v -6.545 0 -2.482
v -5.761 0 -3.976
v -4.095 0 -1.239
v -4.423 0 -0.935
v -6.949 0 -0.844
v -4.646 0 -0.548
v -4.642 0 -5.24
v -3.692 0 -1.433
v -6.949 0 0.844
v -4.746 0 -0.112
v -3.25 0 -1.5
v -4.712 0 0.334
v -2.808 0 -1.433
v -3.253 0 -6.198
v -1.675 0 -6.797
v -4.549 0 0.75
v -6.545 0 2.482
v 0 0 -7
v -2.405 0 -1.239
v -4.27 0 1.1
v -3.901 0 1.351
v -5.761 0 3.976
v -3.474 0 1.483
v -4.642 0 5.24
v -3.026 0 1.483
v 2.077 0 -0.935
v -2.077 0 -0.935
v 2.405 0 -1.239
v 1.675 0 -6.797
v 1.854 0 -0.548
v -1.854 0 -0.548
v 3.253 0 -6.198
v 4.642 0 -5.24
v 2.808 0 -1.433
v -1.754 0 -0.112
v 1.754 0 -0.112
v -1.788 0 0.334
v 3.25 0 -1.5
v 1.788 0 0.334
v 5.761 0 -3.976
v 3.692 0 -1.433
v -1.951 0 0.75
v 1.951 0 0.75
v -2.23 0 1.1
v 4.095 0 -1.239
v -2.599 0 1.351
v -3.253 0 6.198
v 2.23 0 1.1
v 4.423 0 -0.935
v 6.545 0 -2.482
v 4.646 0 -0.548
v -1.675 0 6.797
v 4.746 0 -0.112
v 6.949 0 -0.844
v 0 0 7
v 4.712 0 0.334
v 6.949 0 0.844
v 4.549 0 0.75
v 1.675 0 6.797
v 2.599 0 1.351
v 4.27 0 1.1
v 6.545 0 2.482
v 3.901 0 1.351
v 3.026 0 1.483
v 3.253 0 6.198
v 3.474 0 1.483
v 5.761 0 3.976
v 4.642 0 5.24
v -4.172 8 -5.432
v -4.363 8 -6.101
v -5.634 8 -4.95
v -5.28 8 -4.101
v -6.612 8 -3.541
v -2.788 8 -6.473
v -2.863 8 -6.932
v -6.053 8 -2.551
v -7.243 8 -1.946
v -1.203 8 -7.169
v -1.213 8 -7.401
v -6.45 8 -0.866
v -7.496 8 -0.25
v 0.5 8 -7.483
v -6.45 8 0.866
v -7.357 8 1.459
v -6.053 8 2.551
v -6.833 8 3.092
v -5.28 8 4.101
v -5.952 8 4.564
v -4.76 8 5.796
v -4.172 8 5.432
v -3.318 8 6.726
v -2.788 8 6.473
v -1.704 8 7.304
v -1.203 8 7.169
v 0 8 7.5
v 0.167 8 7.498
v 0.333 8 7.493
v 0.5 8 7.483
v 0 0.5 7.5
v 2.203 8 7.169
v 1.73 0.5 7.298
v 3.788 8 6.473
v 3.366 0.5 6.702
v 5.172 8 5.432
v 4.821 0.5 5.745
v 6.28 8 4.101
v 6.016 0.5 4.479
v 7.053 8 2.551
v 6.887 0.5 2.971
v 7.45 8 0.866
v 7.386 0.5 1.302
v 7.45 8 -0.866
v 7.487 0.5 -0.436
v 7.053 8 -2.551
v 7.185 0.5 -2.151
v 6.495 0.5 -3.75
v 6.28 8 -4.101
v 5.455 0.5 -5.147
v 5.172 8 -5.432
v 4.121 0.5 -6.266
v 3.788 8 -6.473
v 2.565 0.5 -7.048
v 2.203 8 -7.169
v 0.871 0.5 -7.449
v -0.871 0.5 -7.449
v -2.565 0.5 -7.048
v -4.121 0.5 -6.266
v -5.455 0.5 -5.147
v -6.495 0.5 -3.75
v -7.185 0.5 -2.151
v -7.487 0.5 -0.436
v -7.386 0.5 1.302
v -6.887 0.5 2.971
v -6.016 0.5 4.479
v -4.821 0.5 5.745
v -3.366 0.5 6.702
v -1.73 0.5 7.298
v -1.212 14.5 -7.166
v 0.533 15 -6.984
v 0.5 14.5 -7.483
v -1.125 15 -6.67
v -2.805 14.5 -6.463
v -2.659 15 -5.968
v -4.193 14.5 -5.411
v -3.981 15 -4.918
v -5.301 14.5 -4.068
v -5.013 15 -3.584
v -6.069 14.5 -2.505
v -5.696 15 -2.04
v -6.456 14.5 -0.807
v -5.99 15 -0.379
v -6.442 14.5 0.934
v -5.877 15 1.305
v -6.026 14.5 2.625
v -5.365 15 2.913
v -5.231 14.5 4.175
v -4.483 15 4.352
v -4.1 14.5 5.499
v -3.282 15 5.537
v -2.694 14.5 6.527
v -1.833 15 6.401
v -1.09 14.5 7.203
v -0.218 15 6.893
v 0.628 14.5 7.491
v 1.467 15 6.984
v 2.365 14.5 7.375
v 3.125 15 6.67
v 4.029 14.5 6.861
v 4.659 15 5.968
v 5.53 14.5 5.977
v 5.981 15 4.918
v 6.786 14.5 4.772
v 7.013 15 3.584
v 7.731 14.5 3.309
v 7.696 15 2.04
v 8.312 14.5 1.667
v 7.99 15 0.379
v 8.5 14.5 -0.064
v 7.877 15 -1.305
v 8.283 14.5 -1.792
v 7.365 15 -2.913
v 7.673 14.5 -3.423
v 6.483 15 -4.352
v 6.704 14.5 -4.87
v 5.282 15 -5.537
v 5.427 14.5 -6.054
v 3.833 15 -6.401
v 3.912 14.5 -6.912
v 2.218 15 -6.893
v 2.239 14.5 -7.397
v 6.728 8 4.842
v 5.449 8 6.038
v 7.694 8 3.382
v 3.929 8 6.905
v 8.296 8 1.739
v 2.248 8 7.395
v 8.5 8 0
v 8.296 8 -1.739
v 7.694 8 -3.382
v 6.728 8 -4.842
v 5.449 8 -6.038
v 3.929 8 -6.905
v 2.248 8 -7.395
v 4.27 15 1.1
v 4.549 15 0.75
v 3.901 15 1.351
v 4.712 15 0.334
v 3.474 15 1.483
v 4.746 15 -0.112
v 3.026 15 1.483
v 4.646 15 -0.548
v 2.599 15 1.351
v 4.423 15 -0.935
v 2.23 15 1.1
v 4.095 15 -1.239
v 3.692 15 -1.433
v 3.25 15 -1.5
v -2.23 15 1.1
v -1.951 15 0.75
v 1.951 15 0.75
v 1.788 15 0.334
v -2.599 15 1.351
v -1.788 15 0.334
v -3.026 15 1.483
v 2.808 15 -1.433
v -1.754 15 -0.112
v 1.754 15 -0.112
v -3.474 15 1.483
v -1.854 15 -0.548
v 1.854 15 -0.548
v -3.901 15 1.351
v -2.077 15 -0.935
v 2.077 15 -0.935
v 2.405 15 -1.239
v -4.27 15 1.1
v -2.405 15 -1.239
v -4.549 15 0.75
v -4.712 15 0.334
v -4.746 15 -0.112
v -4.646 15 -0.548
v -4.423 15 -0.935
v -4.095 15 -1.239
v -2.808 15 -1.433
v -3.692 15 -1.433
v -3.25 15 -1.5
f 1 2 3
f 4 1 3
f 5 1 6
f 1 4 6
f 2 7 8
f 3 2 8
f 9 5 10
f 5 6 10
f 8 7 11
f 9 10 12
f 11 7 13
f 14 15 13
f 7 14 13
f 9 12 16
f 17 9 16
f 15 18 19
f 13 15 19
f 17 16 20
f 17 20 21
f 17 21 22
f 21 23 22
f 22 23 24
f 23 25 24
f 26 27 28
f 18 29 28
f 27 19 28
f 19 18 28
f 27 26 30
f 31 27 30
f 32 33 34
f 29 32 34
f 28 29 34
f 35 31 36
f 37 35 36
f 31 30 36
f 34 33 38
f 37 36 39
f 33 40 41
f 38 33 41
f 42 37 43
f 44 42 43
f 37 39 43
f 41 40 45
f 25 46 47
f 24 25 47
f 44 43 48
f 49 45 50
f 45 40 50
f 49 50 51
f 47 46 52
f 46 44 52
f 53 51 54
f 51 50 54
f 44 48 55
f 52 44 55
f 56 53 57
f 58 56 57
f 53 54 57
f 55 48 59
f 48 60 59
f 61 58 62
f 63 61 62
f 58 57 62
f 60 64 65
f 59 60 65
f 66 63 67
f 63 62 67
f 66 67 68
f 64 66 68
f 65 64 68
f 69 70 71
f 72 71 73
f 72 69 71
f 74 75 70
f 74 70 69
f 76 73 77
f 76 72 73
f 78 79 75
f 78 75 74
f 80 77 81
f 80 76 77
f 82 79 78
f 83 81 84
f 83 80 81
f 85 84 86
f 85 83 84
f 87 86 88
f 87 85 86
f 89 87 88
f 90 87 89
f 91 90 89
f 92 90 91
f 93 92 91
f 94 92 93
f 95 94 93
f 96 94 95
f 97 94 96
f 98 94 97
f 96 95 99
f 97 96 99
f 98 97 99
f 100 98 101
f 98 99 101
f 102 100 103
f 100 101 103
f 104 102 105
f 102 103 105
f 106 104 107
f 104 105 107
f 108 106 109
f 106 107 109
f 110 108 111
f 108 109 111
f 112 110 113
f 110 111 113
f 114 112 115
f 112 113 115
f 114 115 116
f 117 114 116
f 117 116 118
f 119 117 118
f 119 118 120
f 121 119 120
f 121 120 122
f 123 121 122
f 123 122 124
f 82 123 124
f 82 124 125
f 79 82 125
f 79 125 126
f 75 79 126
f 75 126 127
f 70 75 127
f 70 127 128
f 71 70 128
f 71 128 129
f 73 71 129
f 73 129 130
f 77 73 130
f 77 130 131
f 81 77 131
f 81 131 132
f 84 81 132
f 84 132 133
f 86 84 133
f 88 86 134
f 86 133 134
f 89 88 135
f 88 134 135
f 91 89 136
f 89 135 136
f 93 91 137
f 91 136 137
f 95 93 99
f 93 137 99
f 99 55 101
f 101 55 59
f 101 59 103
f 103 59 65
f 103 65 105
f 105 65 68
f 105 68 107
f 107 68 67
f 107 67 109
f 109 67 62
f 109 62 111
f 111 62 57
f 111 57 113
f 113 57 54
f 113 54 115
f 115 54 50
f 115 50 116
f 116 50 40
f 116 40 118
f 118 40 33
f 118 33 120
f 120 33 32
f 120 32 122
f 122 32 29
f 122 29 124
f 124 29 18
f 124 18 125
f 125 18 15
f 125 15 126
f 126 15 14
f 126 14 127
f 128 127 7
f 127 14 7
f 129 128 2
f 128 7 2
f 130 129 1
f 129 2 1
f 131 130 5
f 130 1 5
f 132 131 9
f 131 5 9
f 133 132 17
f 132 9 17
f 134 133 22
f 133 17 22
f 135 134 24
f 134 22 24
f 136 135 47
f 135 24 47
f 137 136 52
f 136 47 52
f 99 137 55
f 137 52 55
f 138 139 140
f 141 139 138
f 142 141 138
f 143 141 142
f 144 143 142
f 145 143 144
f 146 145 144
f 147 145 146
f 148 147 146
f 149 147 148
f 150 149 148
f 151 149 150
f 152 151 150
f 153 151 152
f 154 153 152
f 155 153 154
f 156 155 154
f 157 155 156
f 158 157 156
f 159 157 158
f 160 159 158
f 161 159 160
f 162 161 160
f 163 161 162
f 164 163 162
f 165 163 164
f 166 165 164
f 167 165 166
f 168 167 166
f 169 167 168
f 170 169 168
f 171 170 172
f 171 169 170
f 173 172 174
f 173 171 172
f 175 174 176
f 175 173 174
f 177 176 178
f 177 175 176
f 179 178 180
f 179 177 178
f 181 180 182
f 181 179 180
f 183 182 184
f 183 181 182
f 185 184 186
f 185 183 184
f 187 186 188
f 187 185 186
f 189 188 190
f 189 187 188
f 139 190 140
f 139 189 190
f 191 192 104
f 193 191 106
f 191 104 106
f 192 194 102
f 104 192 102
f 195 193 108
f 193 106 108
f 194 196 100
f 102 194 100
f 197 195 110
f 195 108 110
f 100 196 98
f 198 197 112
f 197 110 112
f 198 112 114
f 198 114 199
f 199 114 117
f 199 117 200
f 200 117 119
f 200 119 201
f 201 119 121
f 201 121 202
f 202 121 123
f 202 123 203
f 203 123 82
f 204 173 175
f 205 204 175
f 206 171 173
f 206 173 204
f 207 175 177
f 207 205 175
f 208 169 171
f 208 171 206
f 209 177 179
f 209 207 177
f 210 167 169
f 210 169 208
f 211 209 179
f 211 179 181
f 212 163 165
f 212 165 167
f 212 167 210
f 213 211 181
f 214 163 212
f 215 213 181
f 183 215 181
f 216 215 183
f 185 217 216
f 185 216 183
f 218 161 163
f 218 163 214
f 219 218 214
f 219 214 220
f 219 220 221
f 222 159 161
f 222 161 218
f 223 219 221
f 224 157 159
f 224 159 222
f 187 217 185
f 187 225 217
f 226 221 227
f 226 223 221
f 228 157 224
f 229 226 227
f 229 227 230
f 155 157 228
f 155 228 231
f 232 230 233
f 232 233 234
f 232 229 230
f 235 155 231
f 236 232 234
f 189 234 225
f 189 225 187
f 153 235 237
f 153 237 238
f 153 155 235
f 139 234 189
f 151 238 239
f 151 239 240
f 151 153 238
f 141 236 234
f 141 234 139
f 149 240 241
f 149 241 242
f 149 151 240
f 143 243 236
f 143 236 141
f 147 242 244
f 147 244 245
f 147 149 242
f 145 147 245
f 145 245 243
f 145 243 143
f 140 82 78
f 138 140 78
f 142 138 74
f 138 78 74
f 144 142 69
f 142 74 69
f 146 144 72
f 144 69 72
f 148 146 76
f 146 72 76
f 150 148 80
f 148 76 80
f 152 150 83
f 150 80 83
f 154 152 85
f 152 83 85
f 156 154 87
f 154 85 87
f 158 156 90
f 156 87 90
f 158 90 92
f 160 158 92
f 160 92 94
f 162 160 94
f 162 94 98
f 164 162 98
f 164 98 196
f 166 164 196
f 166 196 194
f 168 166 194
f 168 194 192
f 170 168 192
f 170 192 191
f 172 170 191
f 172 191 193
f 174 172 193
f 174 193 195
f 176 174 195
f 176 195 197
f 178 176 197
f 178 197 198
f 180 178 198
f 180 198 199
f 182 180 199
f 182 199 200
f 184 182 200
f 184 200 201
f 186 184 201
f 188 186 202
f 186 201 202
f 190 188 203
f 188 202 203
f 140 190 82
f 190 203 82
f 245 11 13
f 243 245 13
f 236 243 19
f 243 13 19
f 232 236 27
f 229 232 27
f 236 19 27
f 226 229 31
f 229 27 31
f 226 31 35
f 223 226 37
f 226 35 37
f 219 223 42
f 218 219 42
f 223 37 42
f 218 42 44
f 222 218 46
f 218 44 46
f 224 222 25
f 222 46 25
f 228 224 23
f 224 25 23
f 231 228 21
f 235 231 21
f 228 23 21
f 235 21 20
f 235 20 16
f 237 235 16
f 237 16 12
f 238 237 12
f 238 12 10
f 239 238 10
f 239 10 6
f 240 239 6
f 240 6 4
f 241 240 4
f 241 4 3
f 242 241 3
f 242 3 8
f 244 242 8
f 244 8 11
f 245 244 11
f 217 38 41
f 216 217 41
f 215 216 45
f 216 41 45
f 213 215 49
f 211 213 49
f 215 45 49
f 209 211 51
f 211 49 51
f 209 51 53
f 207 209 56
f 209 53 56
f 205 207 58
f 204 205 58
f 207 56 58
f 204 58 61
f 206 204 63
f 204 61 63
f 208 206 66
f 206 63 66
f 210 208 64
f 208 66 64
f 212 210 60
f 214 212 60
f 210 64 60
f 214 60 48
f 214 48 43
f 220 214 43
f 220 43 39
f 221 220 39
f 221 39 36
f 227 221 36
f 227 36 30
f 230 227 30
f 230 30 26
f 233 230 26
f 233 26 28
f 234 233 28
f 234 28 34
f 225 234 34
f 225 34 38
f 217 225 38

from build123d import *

# Parameters (mm, degrees)
SKETCH1_R           = 7.5
BOSS_EXTRUDE1_DEPTH = 8
SKETCH2_R           = 7.5
BOSS_EXTRUDE2_DEPTH = 7
SKETCH3_R           = 1.5
CUT_EXTRUDE1_DEPTH  = 19.801595677
CHAMFER1_SIZE       = 0.5


with BuildPart() as part:
    # Sketch1 → Boss-Extrude1 (new body)
    with BuildSketch(Plane(origin=(0, 0, 0), x_dir=(1, 0, 0), z_dir=(0, 1, 0))):
        with Locations(Location((0, 0, 0), (0, 0, 270))):
            Circle(SKETCH1_R)
    extrude(amount=BOSS_EXTRUDE1_DEPTH)

    # Sketch2 → Boss-Extrude2 (add)
    with BuildSketch(Plane(origin=(0, 8, 0), x_dir=(1, 0, 0), z_dir=(0, 1, 0))):
        with Locations(Location((1, 0, 0), (0, 0, 93.822553729))):
            Circle(SKETCH2_R)
    extrude(amount=BOSS_EXTRUDE2_DEPTH)

    # Sketch3 → Cut-Extrude1 (cut, through all)
    with BuildSketch(Plane.XZ):
        with Locations(Location((-3.25, 0, 0), (0, 0, 270))):
            Circle(SKETCH3_R)
        with Locations(Location((3.25, 0, 0), (0, 0, 270))):
            Circle(SKETCH3_R)
    extrude(amount=-CUT_EXTRUDE1_DEPTH, mode=Mode.SUBTRACT)

    # Chamfer1
    chamfer1_edges = [part.edges().sort_by_distance(p)[0] for p in [
        (0, 0, -7.5),
        (1.5, 15, 7.483314774),
    ]]
    chamfer(chamfer1_edges, length=CHAMFER1_SIZE)


solid = part.part
